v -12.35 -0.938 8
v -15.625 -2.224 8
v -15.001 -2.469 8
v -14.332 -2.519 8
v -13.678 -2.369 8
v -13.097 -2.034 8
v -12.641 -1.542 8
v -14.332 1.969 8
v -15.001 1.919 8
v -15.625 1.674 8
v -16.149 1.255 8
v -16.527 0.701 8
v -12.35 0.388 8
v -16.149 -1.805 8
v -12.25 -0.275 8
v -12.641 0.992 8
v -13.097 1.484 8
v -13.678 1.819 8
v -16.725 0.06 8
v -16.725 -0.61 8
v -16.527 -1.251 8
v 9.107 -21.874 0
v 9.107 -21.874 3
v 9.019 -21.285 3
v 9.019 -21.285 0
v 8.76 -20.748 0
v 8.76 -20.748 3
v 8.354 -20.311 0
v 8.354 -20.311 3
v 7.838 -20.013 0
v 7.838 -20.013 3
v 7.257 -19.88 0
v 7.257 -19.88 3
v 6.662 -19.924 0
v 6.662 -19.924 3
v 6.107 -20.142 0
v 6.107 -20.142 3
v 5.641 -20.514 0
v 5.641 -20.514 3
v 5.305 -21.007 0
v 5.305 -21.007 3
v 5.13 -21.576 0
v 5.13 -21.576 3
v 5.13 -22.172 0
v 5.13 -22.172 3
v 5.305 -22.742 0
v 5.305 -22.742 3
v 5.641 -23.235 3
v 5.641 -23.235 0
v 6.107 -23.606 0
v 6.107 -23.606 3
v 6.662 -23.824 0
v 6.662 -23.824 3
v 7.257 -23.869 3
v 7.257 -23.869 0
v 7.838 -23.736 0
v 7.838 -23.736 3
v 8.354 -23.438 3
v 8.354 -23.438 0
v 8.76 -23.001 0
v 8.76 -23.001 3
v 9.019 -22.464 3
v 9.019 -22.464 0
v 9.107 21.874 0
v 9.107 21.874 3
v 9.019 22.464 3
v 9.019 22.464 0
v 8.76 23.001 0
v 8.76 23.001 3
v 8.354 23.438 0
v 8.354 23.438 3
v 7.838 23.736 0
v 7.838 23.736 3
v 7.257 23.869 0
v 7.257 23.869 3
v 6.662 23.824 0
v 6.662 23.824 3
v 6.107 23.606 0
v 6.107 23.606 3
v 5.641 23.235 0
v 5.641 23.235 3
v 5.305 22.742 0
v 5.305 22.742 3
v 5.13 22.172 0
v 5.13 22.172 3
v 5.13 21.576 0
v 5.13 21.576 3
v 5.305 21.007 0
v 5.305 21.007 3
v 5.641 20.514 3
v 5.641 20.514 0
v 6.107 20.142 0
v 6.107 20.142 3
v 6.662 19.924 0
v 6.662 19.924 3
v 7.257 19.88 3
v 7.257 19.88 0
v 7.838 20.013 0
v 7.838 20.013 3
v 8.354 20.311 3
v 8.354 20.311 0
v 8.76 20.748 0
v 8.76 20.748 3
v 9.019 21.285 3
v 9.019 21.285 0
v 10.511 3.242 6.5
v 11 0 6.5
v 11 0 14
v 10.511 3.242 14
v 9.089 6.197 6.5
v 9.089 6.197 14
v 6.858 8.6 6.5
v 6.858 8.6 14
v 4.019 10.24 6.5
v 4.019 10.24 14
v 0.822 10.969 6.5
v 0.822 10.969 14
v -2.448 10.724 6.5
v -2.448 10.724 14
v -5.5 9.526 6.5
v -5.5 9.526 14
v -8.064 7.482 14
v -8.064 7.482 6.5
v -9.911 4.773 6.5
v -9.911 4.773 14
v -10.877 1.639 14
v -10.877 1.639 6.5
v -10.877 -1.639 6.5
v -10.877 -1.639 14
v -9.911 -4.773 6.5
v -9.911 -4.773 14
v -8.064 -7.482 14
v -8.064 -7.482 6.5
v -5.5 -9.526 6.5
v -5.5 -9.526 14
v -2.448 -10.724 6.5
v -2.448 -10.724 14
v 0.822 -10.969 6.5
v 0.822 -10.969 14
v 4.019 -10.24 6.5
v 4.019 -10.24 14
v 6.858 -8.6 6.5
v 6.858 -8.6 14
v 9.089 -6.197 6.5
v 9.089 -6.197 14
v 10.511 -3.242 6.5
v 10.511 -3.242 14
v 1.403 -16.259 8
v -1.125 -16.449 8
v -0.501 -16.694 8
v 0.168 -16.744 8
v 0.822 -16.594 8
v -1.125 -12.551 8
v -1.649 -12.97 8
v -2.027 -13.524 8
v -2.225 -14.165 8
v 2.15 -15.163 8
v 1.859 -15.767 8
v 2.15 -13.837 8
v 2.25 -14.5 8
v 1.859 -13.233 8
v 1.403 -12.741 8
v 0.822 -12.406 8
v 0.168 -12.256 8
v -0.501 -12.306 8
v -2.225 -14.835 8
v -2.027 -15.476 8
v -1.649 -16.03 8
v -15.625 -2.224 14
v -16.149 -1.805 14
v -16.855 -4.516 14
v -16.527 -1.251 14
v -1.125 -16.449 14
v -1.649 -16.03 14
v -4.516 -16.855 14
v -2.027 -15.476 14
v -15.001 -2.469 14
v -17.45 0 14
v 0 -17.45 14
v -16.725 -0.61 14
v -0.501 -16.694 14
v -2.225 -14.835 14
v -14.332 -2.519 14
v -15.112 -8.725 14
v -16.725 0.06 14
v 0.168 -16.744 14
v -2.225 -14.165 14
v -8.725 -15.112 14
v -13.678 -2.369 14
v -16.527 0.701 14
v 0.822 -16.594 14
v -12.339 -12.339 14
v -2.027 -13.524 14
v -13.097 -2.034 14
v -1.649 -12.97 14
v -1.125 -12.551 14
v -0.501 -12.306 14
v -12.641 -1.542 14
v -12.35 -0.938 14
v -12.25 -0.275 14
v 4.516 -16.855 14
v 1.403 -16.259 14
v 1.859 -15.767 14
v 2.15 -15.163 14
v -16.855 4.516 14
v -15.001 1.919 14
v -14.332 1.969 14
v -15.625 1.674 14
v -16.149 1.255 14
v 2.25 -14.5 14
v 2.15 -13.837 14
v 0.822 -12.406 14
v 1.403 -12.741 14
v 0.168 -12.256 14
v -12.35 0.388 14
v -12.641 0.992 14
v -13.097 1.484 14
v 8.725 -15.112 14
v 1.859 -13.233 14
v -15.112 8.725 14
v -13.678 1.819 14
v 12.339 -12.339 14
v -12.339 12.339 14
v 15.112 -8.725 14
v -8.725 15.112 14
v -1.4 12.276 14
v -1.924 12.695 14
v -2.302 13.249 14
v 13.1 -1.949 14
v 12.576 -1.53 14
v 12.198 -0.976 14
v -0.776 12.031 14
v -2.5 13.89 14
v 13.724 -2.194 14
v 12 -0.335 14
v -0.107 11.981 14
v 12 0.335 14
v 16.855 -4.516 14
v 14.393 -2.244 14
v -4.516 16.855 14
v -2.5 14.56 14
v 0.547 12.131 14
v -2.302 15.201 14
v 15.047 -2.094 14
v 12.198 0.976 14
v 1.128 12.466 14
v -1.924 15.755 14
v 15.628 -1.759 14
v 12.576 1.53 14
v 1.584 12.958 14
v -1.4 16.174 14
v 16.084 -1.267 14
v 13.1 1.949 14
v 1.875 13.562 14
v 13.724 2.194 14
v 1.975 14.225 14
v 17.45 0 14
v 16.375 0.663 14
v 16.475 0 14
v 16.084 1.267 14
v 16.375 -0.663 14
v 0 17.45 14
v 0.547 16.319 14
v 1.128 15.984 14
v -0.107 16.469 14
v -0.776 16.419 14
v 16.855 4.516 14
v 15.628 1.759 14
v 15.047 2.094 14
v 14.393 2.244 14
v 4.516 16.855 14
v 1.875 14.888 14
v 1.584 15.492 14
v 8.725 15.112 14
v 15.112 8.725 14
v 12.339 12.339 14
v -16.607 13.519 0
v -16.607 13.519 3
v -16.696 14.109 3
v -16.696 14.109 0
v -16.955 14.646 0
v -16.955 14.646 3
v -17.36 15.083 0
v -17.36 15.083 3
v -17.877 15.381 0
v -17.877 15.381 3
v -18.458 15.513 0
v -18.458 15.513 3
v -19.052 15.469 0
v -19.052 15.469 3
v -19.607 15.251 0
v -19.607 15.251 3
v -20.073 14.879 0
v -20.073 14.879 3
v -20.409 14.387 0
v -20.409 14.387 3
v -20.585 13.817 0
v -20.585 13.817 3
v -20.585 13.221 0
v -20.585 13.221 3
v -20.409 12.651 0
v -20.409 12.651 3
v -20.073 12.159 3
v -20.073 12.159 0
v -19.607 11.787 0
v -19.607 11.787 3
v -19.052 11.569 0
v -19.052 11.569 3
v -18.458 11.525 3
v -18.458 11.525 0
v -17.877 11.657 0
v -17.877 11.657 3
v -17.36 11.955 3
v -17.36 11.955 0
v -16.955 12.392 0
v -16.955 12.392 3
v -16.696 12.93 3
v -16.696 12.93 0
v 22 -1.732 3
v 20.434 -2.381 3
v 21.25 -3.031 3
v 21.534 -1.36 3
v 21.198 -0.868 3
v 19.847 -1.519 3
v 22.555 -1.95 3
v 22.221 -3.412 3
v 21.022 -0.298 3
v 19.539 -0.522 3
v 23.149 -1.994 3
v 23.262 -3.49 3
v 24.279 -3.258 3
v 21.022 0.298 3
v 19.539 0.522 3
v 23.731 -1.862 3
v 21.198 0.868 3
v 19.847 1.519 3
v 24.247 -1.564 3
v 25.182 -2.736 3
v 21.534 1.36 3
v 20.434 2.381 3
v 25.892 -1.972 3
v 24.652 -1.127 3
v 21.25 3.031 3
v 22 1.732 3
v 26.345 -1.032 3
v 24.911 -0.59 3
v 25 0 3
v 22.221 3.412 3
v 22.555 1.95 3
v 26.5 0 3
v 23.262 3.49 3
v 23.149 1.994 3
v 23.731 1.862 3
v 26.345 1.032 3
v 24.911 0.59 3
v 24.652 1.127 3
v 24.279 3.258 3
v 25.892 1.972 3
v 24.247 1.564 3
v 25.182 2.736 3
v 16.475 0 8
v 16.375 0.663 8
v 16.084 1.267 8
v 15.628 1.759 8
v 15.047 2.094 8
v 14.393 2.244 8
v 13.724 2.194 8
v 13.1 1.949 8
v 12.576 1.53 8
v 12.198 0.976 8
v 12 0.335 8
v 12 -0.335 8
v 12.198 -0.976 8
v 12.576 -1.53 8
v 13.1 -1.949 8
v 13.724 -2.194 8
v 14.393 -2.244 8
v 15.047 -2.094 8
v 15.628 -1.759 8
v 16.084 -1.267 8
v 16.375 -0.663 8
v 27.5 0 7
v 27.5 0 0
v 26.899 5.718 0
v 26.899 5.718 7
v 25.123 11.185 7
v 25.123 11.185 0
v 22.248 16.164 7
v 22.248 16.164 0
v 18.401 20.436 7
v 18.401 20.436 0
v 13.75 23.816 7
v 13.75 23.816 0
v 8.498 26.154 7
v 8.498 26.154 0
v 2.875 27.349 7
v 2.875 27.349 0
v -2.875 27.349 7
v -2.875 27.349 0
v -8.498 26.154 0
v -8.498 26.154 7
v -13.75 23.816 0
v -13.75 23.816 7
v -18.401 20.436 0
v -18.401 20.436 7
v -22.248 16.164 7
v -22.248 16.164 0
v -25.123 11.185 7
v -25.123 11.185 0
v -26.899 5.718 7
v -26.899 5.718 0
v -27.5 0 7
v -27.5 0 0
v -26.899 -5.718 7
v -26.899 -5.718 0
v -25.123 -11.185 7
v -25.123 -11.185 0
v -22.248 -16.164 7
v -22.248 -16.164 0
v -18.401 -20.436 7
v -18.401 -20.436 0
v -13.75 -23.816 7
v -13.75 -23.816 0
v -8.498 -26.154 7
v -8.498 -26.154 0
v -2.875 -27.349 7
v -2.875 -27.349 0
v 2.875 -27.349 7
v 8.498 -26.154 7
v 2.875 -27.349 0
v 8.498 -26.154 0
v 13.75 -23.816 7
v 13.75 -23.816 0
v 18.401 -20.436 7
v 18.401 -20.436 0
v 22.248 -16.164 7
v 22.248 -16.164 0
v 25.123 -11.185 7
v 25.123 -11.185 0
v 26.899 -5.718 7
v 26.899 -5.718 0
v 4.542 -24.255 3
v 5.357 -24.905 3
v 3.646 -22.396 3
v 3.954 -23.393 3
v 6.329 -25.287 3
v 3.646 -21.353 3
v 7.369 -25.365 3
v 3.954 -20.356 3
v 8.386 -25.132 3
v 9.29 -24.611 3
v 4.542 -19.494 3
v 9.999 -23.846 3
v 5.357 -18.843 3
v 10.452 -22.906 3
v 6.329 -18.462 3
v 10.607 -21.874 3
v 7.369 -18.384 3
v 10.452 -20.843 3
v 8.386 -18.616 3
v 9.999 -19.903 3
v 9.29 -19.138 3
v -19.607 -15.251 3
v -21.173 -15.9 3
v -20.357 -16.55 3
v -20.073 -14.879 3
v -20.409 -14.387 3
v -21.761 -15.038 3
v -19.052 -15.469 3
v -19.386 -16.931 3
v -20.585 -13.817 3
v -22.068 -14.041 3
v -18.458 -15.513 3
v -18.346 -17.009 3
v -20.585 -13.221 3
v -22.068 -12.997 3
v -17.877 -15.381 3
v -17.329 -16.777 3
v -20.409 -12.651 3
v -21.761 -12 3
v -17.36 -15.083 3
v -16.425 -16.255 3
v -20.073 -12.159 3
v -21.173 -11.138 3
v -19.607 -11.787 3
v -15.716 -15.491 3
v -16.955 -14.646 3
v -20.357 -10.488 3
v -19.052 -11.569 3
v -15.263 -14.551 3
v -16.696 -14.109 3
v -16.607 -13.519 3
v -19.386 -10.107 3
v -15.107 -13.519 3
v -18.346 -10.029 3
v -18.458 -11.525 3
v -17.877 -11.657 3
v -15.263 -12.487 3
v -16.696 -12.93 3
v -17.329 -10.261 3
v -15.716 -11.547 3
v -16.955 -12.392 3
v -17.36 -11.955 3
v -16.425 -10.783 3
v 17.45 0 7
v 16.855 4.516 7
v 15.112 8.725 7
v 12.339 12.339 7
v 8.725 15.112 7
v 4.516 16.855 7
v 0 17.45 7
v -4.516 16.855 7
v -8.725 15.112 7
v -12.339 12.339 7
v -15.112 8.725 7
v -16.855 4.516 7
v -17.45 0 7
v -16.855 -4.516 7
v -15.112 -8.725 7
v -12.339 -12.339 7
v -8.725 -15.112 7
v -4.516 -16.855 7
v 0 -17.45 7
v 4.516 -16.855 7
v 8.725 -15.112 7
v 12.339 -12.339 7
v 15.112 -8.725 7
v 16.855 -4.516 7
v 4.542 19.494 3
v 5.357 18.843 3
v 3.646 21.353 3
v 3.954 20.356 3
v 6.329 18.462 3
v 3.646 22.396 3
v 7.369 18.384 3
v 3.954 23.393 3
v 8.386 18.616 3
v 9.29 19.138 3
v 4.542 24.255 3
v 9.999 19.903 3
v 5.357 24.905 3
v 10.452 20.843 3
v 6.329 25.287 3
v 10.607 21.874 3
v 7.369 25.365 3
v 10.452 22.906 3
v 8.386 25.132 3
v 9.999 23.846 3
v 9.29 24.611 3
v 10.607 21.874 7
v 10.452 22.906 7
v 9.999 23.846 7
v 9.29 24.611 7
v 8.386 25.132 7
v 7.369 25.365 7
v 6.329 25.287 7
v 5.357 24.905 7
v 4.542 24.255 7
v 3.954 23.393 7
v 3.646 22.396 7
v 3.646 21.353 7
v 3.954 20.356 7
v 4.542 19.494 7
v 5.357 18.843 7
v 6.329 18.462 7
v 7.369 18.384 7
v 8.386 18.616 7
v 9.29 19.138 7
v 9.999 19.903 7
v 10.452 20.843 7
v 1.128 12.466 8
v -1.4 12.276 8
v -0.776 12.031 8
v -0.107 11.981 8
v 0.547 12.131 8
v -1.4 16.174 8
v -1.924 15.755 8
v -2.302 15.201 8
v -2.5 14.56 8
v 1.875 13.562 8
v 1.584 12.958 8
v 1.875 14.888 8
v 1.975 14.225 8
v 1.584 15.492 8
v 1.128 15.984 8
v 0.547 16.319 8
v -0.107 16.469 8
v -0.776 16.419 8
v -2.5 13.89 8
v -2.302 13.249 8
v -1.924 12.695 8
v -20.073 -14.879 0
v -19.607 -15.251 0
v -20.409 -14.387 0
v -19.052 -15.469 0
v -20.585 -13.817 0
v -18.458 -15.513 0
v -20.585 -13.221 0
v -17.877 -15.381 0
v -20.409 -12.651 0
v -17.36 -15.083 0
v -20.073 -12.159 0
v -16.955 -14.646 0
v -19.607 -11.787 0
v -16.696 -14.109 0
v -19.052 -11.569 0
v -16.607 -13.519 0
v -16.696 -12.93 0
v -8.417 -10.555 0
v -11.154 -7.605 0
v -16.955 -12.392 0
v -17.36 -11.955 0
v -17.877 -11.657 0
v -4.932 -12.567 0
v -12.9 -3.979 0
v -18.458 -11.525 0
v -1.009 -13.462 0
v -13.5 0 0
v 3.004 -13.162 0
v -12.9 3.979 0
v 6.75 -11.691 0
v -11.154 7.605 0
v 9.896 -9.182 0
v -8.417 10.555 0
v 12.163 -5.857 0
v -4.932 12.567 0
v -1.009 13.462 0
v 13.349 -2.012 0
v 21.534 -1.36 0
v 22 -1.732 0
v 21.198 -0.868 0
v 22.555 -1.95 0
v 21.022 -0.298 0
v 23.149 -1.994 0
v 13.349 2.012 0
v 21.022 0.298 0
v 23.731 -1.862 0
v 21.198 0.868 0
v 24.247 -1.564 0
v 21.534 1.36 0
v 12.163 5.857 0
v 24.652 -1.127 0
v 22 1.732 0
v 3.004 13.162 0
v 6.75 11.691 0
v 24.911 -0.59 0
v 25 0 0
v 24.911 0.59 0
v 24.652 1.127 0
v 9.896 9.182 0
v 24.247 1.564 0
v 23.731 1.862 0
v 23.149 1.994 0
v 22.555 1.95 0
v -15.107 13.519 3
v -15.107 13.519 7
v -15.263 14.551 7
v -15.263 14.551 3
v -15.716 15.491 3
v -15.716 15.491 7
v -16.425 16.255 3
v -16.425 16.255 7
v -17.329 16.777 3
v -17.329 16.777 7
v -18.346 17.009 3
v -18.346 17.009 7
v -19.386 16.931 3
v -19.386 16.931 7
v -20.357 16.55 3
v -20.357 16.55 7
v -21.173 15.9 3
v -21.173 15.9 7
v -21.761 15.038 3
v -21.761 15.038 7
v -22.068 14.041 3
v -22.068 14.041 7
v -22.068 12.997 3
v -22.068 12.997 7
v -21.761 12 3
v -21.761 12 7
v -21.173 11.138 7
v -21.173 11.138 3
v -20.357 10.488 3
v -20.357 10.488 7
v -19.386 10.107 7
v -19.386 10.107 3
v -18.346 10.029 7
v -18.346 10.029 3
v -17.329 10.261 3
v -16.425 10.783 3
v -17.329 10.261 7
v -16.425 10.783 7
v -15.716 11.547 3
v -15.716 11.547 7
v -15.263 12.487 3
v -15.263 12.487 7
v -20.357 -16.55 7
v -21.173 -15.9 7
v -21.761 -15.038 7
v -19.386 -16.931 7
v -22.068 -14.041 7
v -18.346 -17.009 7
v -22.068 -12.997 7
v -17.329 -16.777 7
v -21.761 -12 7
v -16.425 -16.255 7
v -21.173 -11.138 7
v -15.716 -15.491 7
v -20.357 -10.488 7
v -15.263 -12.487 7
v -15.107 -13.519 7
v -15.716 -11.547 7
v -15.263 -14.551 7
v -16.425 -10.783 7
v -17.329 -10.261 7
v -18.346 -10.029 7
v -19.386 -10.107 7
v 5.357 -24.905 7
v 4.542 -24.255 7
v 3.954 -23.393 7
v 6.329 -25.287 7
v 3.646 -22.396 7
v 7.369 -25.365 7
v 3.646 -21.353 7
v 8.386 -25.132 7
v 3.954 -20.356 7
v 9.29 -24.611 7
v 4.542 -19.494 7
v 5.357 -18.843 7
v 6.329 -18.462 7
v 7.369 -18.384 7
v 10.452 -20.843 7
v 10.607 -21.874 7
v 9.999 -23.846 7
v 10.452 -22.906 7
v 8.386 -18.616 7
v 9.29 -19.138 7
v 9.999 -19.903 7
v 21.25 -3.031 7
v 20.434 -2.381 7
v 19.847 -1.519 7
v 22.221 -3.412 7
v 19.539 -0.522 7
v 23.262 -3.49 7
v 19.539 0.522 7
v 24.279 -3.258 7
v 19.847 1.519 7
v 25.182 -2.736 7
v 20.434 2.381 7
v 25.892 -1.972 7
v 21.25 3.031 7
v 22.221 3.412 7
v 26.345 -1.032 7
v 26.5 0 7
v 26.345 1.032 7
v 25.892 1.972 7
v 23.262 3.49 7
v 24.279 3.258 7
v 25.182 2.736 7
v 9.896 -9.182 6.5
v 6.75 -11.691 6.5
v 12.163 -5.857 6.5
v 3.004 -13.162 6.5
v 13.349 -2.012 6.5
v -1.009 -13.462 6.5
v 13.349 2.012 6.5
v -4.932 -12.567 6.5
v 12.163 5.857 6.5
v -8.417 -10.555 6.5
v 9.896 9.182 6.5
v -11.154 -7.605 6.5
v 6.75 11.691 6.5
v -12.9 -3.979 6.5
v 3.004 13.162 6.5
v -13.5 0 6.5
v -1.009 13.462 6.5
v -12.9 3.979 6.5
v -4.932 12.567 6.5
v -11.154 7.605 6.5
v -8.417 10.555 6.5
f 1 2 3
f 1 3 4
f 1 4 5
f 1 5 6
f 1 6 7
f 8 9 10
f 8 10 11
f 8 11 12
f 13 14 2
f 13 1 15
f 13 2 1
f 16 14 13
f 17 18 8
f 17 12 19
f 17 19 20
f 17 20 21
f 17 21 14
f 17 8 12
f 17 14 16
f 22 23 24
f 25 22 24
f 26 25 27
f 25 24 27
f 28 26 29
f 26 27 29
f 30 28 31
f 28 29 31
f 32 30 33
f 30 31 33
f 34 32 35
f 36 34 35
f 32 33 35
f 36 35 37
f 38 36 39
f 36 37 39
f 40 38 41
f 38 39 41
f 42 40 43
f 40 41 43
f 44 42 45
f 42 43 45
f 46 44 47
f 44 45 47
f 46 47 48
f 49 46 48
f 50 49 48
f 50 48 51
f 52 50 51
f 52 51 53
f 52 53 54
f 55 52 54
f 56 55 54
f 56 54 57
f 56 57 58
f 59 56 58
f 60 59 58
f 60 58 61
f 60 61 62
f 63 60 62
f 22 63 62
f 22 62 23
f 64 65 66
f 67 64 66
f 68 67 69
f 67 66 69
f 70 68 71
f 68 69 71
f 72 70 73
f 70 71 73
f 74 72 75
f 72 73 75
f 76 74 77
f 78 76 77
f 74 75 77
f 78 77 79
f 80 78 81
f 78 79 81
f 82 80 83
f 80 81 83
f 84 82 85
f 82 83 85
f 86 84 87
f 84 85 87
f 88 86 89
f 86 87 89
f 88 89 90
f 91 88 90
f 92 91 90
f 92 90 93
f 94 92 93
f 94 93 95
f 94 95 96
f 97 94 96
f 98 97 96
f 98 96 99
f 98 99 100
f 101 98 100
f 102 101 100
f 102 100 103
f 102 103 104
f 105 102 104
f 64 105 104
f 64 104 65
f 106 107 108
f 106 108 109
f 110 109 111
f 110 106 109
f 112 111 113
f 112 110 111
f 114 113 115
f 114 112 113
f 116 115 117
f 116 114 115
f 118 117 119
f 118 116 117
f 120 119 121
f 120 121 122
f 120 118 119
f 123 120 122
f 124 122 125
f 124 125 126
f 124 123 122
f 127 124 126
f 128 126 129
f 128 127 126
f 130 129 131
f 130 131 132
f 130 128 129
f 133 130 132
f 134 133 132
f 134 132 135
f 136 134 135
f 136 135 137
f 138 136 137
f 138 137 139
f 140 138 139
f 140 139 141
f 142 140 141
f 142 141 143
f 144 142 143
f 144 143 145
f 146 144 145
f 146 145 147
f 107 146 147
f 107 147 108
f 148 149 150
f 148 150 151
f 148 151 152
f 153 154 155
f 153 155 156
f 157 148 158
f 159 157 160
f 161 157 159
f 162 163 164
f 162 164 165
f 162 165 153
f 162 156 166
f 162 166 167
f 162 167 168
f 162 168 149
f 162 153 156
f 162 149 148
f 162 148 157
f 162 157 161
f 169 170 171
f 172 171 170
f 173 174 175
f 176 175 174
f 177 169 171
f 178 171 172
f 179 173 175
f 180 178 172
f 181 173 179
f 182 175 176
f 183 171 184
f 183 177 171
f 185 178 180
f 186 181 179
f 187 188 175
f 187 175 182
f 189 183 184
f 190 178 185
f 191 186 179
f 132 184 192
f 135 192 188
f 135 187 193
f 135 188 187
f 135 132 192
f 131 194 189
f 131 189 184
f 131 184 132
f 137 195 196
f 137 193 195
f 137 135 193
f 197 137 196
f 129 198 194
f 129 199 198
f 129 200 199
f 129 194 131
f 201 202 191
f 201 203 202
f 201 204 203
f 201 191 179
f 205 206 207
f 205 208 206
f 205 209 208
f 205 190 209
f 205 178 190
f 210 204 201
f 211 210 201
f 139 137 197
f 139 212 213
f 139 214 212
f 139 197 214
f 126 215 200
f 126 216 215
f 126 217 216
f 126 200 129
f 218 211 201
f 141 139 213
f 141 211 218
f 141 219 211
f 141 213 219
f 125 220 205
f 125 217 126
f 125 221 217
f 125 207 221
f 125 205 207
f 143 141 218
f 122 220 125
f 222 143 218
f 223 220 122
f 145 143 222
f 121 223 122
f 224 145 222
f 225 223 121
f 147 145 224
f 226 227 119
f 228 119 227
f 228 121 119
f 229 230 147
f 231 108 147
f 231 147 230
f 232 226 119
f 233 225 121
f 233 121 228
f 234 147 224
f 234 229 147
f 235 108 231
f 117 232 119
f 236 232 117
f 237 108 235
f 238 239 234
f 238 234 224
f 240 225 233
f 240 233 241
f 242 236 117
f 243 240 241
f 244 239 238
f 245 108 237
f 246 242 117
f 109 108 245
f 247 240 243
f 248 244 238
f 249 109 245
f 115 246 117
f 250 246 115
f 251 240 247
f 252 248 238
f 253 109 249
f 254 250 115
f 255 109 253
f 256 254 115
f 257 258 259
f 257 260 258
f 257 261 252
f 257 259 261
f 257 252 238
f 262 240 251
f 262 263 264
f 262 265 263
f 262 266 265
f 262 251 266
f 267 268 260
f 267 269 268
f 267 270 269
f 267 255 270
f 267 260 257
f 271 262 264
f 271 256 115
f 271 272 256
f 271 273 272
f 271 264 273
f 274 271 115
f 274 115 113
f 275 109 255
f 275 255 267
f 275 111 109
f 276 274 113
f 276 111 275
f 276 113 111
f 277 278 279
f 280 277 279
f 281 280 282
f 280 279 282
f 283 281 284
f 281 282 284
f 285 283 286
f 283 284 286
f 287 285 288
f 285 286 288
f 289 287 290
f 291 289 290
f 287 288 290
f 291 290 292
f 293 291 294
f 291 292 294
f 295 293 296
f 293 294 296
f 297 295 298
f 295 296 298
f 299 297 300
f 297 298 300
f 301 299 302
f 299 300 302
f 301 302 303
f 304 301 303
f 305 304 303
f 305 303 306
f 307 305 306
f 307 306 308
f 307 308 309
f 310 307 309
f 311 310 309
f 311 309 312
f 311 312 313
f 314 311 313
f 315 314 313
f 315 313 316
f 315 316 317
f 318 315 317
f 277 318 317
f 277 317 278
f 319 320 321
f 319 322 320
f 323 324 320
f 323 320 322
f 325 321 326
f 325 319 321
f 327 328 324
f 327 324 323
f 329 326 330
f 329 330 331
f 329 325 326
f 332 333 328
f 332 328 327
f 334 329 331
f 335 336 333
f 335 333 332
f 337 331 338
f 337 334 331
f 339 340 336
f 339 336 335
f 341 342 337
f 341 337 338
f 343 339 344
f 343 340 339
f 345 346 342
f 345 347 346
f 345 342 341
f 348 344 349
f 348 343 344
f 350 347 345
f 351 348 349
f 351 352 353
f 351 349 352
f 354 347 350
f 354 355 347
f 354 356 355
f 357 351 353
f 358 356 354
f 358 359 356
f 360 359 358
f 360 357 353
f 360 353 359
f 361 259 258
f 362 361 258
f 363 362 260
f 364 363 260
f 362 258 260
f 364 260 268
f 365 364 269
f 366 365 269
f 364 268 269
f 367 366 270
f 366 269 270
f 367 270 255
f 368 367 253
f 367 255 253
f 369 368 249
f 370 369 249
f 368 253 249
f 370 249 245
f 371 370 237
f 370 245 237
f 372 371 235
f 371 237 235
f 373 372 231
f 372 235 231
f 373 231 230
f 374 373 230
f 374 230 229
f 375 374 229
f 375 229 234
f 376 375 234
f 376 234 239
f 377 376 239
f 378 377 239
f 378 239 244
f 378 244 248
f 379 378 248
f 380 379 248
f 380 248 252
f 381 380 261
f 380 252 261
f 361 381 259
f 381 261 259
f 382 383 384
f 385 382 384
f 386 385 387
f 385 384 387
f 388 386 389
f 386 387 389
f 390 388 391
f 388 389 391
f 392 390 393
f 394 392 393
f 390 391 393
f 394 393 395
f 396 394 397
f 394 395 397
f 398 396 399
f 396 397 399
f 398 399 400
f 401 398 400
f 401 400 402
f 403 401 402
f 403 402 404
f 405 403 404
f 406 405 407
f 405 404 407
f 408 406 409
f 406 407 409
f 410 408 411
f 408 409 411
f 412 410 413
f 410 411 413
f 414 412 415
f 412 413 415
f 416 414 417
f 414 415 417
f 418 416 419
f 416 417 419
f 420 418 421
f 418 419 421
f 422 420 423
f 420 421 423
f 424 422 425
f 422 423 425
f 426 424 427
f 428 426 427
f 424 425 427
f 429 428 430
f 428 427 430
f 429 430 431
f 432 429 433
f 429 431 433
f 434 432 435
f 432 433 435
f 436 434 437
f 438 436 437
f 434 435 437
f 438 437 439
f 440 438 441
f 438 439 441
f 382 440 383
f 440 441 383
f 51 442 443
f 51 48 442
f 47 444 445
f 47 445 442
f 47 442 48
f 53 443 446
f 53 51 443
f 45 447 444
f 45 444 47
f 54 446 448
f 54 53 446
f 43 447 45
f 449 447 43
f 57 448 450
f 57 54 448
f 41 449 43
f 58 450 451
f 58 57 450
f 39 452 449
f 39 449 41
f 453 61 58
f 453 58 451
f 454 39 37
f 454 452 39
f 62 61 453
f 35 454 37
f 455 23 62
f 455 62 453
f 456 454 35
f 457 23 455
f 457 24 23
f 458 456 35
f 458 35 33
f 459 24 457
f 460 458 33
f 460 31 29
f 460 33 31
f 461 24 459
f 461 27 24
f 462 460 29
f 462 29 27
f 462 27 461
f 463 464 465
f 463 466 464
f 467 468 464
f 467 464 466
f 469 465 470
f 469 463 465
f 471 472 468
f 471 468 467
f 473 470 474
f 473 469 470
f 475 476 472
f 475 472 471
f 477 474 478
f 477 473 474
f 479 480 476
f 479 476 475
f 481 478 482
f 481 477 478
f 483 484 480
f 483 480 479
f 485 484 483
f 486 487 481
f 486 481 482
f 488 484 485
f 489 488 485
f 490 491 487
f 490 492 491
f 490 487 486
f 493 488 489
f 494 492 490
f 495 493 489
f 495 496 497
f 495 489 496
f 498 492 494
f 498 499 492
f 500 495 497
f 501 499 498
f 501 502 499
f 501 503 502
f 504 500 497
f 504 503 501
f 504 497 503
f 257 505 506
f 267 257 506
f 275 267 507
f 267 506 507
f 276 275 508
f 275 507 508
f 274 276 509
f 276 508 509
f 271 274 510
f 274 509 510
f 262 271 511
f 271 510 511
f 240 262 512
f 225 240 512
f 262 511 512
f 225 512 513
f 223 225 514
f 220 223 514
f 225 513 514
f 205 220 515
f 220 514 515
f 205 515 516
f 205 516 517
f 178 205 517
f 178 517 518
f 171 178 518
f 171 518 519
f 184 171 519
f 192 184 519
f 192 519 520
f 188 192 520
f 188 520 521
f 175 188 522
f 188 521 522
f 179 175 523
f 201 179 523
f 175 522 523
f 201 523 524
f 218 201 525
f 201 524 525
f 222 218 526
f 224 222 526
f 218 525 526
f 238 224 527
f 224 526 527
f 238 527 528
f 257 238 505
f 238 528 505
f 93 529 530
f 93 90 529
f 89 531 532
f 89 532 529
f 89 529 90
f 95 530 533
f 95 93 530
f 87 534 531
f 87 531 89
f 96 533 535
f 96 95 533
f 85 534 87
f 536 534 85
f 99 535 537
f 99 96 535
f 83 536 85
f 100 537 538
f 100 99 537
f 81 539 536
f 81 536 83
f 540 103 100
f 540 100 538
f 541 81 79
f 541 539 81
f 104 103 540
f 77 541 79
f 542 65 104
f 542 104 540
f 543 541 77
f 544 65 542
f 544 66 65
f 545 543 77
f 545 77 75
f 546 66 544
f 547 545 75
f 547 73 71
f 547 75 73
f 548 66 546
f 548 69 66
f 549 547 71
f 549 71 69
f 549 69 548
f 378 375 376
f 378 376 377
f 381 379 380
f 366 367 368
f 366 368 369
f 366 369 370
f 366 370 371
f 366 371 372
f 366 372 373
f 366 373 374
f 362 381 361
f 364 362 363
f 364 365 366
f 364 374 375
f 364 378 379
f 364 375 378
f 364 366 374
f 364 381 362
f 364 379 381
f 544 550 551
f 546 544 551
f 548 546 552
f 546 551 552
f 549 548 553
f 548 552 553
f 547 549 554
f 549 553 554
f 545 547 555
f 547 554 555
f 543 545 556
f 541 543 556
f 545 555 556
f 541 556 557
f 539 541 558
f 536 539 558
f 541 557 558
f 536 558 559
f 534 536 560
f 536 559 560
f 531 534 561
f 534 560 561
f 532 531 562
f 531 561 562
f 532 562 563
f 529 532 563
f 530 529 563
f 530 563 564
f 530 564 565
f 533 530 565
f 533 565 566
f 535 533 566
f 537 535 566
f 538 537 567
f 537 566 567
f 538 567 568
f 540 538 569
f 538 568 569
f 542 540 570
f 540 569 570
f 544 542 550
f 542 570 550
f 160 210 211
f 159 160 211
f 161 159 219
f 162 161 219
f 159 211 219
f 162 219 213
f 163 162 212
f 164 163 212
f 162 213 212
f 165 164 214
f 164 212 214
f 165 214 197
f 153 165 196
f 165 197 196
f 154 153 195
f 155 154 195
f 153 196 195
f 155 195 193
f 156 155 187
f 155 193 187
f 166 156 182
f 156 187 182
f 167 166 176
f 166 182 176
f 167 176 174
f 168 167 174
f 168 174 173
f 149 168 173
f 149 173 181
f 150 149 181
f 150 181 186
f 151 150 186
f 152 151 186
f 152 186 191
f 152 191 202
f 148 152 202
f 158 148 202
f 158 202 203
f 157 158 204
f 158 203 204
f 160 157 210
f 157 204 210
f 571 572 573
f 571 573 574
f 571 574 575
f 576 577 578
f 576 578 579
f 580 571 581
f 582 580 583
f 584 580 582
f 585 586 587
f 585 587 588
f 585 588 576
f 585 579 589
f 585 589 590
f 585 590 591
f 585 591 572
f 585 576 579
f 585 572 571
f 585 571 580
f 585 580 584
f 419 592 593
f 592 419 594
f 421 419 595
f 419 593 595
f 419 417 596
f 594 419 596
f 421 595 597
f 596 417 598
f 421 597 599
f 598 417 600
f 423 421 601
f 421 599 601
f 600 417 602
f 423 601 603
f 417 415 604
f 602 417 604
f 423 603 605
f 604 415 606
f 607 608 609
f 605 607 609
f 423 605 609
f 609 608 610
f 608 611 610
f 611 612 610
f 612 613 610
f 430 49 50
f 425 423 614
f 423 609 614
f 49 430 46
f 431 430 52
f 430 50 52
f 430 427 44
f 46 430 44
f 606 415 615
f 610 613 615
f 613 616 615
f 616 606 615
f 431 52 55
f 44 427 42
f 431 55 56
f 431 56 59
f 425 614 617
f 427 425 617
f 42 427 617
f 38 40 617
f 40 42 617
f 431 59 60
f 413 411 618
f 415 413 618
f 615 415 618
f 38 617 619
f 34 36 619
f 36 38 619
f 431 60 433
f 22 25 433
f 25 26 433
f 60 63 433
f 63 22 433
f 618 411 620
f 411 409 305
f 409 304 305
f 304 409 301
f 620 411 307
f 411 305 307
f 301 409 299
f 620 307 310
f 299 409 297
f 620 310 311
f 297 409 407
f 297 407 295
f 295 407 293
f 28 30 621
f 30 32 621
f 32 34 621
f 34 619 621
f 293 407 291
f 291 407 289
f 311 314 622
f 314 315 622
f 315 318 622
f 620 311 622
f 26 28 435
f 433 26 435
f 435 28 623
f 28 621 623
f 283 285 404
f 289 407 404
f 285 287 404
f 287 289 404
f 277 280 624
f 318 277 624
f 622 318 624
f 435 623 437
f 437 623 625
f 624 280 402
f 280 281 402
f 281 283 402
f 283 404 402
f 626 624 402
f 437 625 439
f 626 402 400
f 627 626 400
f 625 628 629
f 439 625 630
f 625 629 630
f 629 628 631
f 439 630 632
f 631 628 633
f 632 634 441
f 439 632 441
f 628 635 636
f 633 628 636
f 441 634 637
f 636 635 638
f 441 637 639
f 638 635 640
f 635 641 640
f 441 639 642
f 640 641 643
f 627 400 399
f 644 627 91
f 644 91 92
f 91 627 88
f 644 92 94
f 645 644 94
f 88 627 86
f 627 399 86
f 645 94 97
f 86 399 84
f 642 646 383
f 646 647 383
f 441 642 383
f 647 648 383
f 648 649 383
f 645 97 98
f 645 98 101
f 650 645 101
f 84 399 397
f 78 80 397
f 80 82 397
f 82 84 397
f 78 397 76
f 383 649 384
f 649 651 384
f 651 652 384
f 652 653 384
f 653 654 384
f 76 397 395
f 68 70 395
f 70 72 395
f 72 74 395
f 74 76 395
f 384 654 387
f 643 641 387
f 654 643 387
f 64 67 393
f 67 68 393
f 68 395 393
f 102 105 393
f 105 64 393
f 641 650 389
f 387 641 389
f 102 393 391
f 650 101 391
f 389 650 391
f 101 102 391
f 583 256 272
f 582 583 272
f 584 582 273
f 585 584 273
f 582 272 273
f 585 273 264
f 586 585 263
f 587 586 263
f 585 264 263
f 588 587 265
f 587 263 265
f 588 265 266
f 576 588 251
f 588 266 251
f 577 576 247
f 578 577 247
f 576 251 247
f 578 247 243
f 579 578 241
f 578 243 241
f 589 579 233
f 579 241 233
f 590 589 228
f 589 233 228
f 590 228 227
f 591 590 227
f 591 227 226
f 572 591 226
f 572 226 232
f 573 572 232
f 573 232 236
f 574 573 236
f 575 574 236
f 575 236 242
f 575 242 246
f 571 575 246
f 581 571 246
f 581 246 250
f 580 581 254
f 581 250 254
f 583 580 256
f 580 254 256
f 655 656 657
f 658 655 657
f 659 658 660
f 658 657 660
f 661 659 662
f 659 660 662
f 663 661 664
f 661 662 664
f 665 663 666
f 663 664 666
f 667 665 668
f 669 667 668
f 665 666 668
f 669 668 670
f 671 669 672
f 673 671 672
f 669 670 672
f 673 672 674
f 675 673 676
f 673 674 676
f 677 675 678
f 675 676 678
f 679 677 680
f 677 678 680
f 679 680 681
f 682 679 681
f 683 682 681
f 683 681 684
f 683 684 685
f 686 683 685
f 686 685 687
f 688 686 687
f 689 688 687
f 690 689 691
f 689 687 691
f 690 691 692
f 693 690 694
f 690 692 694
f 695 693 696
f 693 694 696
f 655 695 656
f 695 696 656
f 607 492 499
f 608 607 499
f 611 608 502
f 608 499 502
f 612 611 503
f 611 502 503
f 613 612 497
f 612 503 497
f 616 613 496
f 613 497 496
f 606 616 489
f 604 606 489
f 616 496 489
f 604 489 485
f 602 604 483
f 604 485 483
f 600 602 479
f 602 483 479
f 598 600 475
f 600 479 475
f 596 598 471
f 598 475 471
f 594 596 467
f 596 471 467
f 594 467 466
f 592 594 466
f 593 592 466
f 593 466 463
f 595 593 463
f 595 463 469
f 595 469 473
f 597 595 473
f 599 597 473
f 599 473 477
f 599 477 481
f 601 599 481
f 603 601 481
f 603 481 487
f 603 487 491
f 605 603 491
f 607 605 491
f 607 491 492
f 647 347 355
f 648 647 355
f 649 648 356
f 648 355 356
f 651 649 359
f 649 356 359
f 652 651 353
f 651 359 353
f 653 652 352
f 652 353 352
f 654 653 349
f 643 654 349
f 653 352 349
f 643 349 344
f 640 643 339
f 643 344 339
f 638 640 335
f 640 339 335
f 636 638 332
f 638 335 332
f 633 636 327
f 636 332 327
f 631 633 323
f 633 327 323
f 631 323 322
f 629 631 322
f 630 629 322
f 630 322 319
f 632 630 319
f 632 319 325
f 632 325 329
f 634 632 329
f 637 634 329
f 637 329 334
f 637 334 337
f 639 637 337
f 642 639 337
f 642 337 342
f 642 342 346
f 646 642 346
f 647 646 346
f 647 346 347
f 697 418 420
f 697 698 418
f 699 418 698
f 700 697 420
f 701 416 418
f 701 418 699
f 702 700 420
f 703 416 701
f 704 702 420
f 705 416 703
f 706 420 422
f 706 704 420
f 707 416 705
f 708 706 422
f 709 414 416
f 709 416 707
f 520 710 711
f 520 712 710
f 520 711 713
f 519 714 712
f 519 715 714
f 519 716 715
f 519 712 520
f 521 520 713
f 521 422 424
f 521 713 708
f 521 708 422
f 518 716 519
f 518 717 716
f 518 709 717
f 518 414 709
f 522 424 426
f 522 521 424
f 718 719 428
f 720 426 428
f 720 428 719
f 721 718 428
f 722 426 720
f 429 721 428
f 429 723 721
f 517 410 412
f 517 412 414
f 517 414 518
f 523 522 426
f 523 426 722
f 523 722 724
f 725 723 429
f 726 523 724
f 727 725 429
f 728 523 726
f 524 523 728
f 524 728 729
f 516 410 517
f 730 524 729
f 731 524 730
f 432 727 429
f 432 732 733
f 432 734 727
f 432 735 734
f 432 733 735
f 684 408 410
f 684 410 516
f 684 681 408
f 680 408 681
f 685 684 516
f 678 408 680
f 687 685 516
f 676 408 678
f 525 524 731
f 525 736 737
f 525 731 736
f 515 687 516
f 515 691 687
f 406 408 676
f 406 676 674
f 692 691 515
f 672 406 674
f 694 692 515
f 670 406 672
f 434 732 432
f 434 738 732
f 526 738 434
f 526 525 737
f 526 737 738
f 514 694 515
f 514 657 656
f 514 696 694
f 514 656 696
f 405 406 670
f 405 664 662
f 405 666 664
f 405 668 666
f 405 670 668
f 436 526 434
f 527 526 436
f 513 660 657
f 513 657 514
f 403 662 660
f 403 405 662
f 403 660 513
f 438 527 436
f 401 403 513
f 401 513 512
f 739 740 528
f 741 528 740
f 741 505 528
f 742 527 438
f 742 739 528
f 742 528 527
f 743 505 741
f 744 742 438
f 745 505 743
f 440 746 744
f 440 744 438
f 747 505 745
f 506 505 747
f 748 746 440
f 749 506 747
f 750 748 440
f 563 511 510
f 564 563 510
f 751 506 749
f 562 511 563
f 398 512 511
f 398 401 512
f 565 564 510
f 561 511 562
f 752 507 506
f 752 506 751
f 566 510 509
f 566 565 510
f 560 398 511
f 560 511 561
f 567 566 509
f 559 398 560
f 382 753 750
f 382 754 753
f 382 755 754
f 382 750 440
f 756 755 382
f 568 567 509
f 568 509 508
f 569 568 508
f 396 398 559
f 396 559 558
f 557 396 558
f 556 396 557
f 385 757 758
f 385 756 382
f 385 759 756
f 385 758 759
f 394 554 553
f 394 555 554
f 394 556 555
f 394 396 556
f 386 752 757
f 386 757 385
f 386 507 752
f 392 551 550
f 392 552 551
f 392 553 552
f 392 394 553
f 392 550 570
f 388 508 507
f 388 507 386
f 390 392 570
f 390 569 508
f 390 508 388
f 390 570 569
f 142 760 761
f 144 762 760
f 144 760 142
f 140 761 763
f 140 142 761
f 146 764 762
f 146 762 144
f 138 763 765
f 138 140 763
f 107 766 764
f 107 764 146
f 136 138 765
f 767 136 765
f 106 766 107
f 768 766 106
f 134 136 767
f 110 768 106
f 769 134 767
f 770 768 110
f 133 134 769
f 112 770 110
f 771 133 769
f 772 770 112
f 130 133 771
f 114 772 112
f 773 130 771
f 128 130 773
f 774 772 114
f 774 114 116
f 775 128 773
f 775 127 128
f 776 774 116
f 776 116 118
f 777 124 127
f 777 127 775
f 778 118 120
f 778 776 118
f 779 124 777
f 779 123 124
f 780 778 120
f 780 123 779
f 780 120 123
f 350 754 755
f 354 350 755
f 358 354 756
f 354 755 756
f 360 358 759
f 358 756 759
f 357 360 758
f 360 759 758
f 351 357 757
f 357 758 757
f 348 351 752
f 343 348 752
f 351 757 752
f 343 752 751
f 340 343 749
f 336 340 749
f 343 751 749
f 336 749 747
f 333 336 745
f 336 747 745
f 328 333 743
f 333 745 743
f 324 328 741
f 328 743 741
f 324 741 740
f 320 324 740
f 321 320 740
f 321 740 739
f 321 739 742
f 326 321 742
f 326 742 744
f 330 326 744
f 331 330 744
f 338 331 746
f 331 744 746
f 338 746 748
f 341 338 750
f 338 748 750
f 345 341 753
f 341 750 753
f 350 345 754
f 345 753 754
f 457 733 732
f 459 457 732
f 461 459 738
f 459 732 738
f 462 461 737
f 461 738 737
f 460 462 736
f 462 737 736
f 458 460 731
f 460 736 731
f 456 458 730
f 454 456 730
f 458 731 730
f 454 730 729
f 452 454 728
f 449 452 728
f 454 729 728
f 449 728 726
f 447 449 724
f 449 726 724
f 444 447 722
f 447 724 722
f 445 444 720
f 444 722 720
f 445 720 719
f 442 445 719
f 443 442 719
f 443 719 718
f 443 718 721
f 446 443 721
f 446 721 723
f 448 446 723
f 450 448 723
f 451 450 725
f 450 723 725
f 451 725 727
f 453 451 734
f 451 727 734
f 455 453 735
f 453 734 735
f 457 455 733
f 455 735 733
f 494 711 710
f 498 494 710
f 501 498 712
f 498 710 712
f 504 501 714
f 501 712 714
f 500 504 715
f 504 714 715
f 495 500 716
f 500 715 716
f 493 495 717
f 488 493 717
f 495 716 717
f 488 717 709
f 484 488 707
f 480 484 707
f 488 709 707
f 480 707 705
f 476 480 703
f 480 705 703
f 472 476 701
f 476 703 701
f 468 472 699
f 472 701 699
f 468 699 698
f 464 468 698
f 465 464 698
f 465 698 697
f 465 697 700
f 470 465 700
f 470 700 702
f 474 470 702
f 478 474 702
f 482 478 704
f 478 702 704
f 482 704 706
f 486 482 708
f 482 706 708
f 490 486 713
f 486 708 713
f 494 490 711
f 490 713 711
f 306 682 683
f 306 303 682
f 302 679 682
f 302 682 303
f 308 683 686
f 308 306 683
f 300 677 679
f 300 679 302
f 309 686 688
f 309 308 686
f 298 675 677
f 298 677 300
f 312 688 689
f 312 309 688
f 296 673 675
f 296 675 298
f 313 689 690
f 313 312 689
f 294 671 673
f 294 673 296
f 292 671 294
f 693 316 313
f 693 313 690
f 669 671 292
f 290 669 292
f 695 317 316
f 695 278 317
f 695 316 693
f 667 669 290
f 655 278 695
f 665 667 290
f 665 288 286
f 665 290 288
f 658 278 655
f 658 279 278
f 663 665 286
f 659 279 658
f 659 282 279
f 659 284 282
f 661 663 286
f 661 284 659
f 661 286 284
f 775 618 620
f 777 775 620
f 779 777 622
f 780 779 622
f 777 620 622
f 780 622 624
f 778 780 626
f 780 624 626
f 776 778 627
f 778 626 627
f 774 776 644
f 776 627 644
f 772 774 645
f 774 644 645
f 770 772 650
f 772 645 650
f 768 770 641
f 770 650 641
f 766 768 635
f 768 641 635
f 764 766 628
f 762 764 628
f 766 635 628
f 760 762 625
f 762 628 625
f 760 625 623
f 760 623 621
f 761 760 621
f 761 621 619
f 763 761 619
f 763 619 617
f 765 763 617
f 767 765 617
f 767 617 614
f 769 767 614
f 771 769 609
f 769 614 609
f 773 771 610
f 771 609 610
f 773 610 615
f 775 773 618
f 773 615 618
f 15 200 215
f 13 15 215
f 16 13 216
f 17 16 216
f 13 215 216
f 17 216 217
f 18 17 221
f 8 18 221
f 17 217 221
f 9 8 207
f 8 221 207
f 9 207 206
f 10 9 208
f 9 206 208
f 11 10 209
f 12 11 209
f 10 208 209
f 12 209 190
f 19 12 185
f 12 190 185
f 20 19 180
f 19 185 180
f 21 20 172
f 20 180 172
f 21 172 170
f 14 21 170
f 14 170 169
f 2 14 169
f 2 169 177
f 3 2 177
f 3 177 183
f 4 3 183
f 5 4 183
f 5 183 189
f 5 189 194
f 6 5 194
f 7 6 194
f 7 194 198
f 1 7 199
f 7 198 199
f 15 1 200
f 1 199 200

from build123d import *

# Parameters (mm, degrees)
SKETCH1_R              = 27.5
BOTTOMLIP_DEPTH        = 7
SKETCH2_R              = 17.45
SKETCH2_R_2            = 11
UPPERRING_DEPTH        = 7
MIDDLEHOLE_START       = -7
SKETCH4_R              = 11
MIDDLEHOLE_DEPTH       = 7
SKETCH5_R              = 2
STATORHOLES_DEPTH      = 7
SKETCH6_R              = 13.5
INNERBEARINGHOLE_DEPTH = 6.5
SKETCH7_R              = 2.25
MOUNTINGHOLES_DEPTH    = 6
SKETCH8_R              = 3.5
CUT_EXTRUDE1_DEPTH     = 4


with BuildPart() as part:
    # Sketch1 → BottomLip (new body)
    with BuildSketch(Plane.XY):
        Circle(SKETCH1_R)
    extrude(amount=BOTTOMLIP_DEPTH)

    # Sketch2 → UpperRing (add)
    with BuildSketch(Plane.XY.offset(7)):
        Circle(SKETCH2_R)
        Circle(SKETCH2_R_2, mode=Mode.SUBTRACT)
    extrude(amount=UPPERRING_DEPTH)

    # Sketch4 → MiddleHole (cut)
    with BuildSketch(Plane.XY.offset(7).offset(MIDDLEHOLE_START)):
        Circle(SKETCH4_R)
    extrude(amount=MIDDLEHOLE_DEPTH, mode=Mode.SUBTRACT)

    # Sketch5 → StatorHoles (cut)
    with BuildSketch(Plane.XY.offset(7)):
        with Locations((23, 0)):
            Circle(SKETCH5_R)
        with Locations((7.107390871, -21.874299875)):
            Circle(SKETCH5_R)
        with Locations((-18.607390871, -13.519060803)):
            Circle(SKETCH5_R)
        with Locations((-18.607390871, 13.519060803)):
            Circle(SKETCH5_R)
        with Locations((7.107390871, 21.874299875)):
            Circle(SKETCH5_R)
    extrude(amount=-STATORHOLES_DEPTH, mode=Mode.SUBTRACT)

    # Sketch6 → InnerBearingHole (cut)
    with BuildSketch(Plane(origin=(0, 0, 0), x_dir=(-1, 0, 0), z_dir=(0, 0, -1))):
        Circle(SKETCH6_R)
    extrude(amount=-INNERBEARINGHOLE_DEPTH, mode=Mode.SUBTRACT)

    # Sketch7 → MountingHoles (cut)
    with BuildSketch(Plane.XY.offset(14)):
        with Locations((14.225, 0)):
            Circle(SKETCH7_R)
        with Locations((0, -14.5)):
            Circle(SKETCH7_R)
        with Locations((-14.5, -0.275)):
            Circle(SKETCH7_R)
        with Locations((-0.275, 14.225)):
            Circle(SKETCH7_R)
    extrude(amount=-MOUNTINGHOLES_DEPTH, mode=Mode.SUBTRACT)

    # Sketch8 → Cut-Extrude1 (cut)
    with BuildSketch(Plane.XY.offset(7)):
        with Locations((23, 0)):
            Circle(SKETCH8_R)
        with Locations((7.107390871, -21.874299875)):
            Circle(SKETCH8_R)
        with Locations((-18.607390871, -13.519060803)):
            Circle(SKETCH8_R)
        with Locations((-18.607390871, 13.519060803)):
            Circle(SKETCH8_R)
        with Locations((7.107390871, 21.874299875)):
            Circle(SKETCH8_R)
    extrude(amount=-CUT_EXTRUDE1_DEPTH, mode=Mode.SUBTRACT)


solid = part.part
